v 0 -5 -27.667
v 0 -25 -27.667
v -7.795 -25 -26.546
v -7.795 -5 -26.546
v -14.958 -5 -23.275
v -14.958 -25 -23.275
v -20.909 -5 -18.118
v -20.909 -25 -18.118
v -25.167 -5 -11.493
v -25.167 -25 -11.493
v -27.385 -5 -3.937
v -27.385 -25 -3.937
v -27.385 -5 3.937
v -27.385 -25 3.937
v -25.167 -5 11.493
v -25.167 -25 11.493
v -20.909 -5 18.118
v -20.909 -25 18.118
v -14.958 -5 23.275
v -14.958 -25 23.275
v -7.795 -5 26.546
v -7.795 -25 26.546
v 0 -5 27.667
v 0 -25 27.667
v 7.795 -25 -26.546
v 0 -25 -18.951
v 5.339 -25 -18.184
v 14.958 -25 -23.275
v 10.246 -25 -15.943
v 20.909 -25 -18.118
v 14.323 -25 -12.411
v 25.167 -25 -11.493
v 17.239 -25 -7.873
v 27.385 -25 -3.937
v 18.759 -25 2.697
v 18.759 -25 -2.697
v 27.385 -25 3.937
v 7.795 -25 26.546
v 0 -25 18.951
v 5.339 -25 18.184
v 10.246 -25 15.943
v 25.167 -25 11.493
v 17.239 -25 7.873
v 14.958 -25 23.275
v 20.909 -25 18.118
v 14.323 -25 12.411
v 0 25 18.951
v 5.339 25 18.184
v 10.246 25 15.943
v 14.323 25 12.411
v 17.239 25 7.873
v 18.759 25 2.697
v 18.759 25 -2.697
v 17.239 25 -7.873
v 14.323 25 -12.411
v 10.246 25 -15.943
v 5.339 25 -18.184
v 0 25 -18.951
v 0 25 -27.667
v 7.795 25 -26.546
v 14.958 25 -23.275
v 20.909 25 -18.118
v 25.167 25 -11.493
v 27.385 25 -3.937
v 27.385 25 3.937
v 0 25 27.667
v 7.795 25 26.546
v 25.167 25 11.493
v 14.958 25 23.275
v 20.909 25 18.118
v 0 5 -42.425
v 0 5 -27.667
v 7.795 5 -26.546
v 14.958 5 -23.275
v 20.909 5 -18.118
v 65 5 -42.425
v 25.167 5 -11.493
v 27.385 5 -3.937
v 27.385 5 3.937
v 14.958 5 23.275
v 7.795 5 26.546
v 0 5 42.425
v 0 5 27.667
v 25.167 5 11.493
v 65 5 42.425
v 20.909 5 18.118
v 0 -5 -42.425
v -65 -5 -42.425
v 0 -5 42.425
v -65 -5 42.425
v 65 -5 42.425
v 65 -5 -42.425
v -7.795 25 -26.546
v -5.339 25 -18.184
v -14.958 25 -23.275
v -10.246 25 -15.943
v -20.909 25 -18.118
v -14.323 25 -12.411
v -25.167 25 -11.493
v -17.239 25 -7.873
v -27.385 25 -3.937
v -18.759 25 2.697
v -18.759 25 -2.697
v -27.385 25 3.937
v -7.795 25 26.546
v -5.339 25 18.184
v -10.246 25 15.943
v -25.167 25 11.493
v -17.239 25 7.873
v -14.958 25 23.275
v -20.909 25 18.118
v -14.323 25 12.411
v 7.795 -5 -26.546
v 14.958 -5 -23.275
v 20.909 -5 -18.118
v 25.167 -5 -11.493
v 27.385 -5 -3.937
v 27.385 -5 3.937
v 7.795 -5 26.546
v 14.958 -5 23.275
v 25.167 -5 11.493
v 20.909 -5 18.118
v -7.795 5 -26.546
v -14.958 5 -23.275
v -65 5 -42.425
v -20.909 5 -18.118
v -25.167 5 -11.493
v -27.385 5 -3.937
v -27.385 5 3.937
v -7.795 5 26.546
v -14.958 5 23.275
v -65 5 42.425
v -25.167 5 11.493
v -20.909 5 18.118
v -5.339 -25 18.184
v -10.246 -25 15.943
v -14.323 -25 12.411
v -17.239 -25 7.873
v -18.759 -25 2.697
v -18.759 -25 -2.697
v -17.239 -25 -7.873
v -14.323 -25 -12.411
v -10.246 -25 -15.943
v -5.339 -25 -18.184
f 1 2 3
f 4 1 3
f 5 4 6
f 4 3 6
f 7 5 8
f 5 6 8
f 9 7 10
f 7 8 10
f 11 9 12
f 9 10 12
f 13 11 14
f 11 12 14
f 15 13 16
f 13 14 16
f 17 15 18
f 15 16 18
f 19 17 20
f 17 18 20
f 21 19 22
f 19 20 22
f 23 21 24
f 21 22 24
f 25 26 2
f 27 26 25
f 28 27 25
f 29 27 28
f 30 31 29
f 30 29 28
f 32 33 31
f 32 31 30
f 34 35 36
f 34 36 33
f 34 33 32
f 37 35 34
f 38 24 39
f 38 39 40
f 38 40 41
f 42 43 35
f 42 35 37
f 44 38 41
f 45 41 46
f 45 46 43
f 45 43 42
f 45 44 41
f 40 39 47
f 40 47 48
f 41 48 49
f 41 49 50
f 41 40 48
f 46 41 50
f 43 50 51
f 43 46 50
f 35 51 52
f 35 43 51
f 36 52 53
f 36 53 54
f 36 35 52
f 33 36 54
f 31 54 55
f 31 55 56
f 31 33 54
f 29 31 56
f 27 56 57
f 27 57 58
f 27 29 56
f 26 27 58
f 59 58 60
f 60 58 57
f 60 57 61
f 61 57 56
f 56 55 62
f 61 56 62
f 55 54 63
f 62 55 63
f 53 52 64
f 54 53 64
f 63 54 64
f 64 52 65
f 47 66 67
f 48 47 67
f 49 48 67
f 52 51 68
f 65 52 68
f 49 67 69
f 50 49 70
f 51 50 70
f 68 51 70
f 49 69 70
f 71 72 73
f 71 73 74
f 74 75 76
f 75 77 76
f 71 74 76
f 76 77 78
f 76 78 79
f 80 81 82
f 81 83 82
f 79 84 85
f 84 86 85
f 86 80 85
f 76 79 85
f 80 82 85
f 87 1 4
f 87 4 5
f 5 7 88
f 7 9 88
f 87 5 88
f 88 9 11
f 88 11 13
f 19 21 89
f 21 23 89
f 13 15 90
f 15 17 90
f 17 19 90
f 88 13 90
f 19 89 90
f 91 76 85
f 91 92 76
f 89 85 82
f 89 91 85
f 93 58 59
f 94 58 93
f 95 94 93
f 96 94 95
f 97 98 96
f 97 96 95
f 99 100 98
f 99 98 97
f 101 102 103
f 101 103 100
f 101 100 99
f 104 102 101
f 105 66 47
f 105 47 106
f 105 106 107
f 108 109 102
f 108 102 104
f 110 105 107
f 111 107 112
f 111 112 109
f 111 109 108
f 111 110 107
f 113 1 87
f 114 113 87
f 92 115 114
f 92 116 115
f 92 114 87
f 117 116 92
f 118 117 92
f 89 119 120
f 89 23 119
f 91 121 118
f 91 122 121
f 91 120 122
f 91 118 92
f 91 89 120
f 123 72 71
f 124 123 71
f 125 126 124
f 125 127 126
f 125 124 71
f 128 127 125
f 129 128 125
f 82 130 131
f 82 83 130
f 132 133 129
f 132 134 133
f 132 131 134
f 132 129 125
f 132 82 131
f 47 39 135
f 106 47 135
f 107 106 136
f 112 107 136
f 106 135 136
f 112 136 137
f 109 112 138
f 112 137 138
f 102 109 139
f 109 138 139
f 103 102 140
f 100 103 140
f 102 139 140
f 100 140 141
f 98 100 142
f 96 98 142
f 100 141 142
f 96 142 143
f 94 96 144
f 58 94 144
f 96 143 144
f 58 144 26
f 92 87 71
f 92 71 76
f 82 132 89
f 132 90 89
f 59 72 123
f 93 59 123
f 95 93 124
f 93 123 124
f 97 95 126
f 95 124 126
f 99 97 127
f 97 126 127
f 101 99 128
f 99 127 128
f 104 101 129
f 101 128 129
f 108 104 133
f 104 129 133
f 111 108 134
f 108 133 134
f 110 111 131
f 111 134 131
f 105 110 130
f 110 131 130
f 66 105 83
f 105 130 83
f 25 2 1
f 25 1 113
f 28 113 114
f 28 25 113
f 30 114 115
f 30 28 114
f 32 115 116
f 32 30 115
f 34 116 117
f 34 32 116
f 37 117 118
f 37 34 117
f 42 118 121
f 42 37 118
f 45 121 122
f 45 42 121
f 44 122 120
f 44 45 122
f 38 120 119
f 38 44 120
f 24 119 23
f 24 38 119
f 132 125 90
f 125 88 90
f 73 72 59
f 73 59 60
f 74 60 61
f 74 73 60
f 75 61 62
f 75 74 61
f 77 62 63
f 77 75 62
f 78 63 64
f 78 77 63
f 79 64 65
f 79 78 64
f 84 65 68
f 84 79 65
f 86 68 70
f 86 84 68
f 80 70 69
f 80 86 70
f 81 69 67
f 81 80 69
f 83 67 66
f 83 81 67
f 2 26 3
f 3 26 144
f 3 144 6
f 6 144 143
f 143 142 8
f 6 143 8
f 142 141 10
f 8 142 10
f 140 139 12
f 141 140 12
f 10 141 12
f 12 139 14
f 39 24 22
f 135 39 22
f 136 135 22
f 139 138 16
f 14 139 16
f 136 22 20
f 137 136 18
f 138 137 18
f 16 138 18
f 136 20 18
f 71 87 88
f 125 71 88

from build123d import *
from build123d import SkipClean  # not in build123d's __all__

# Parameters (mm, degrees)
F1_DEPTH = 25
F3_DEPTH = 5


with BuildPart() as f1:
    # F0 (on Front) → F1 (new body, symmetric)
    with BuildSketch(Plane.XZ):
        with BuildLine():
            Line((0, 27.6668258011), (0, 18.9514327794))
            ThreePointArc((0, 18.9514327794), (18.9514327794, 0), (0, -18.9514327794))
            Line((0, -18.9514327794), (0, -27.6668258011))
            ThreePointArc((0, -27.6668258011), (27.6668258011, 0), (0, 27.6668258011))
        make_face()
    extrude(amount=F1_DEPTH, both=True)

    # F2 (on Front) → F3 (join, symmetric)
    with BuildSketch(Plane.XZ):
        with BuildLine():
            Line((0, 42.4246681583), (0, 27.4246681583))
            ThreePointArc((0, 27.4246681583), (27.4246681583, 0), (0, -27.4246681583))
            Line((0, -27.4246681583), (0, -42.4246681583))
            Line((0, -42.4246681583), (65, -42.4246681583))
            Line((65, -42.4246681583), (65, 42.4246681583))
            Line((65, 42.4246681583), (0, 42.4246681583))
        make_face()
    extrude(amount=F3_DEPTH, both=True)

    # F4: F1 across face


with BuildPart() as f1_1:
    add(f1.part, clean=False)
    with SkipClean():  # cleaning this boolean's faces spoils the solid; the shape is the same uncleaned
        add(f1.part.mirror(Plane(origin=(0, 0, 26.2783197478), x_dir=(0, -1, 0), z_dir=(-1, 0, 0))), clean=False)


solid = f1_1.part
